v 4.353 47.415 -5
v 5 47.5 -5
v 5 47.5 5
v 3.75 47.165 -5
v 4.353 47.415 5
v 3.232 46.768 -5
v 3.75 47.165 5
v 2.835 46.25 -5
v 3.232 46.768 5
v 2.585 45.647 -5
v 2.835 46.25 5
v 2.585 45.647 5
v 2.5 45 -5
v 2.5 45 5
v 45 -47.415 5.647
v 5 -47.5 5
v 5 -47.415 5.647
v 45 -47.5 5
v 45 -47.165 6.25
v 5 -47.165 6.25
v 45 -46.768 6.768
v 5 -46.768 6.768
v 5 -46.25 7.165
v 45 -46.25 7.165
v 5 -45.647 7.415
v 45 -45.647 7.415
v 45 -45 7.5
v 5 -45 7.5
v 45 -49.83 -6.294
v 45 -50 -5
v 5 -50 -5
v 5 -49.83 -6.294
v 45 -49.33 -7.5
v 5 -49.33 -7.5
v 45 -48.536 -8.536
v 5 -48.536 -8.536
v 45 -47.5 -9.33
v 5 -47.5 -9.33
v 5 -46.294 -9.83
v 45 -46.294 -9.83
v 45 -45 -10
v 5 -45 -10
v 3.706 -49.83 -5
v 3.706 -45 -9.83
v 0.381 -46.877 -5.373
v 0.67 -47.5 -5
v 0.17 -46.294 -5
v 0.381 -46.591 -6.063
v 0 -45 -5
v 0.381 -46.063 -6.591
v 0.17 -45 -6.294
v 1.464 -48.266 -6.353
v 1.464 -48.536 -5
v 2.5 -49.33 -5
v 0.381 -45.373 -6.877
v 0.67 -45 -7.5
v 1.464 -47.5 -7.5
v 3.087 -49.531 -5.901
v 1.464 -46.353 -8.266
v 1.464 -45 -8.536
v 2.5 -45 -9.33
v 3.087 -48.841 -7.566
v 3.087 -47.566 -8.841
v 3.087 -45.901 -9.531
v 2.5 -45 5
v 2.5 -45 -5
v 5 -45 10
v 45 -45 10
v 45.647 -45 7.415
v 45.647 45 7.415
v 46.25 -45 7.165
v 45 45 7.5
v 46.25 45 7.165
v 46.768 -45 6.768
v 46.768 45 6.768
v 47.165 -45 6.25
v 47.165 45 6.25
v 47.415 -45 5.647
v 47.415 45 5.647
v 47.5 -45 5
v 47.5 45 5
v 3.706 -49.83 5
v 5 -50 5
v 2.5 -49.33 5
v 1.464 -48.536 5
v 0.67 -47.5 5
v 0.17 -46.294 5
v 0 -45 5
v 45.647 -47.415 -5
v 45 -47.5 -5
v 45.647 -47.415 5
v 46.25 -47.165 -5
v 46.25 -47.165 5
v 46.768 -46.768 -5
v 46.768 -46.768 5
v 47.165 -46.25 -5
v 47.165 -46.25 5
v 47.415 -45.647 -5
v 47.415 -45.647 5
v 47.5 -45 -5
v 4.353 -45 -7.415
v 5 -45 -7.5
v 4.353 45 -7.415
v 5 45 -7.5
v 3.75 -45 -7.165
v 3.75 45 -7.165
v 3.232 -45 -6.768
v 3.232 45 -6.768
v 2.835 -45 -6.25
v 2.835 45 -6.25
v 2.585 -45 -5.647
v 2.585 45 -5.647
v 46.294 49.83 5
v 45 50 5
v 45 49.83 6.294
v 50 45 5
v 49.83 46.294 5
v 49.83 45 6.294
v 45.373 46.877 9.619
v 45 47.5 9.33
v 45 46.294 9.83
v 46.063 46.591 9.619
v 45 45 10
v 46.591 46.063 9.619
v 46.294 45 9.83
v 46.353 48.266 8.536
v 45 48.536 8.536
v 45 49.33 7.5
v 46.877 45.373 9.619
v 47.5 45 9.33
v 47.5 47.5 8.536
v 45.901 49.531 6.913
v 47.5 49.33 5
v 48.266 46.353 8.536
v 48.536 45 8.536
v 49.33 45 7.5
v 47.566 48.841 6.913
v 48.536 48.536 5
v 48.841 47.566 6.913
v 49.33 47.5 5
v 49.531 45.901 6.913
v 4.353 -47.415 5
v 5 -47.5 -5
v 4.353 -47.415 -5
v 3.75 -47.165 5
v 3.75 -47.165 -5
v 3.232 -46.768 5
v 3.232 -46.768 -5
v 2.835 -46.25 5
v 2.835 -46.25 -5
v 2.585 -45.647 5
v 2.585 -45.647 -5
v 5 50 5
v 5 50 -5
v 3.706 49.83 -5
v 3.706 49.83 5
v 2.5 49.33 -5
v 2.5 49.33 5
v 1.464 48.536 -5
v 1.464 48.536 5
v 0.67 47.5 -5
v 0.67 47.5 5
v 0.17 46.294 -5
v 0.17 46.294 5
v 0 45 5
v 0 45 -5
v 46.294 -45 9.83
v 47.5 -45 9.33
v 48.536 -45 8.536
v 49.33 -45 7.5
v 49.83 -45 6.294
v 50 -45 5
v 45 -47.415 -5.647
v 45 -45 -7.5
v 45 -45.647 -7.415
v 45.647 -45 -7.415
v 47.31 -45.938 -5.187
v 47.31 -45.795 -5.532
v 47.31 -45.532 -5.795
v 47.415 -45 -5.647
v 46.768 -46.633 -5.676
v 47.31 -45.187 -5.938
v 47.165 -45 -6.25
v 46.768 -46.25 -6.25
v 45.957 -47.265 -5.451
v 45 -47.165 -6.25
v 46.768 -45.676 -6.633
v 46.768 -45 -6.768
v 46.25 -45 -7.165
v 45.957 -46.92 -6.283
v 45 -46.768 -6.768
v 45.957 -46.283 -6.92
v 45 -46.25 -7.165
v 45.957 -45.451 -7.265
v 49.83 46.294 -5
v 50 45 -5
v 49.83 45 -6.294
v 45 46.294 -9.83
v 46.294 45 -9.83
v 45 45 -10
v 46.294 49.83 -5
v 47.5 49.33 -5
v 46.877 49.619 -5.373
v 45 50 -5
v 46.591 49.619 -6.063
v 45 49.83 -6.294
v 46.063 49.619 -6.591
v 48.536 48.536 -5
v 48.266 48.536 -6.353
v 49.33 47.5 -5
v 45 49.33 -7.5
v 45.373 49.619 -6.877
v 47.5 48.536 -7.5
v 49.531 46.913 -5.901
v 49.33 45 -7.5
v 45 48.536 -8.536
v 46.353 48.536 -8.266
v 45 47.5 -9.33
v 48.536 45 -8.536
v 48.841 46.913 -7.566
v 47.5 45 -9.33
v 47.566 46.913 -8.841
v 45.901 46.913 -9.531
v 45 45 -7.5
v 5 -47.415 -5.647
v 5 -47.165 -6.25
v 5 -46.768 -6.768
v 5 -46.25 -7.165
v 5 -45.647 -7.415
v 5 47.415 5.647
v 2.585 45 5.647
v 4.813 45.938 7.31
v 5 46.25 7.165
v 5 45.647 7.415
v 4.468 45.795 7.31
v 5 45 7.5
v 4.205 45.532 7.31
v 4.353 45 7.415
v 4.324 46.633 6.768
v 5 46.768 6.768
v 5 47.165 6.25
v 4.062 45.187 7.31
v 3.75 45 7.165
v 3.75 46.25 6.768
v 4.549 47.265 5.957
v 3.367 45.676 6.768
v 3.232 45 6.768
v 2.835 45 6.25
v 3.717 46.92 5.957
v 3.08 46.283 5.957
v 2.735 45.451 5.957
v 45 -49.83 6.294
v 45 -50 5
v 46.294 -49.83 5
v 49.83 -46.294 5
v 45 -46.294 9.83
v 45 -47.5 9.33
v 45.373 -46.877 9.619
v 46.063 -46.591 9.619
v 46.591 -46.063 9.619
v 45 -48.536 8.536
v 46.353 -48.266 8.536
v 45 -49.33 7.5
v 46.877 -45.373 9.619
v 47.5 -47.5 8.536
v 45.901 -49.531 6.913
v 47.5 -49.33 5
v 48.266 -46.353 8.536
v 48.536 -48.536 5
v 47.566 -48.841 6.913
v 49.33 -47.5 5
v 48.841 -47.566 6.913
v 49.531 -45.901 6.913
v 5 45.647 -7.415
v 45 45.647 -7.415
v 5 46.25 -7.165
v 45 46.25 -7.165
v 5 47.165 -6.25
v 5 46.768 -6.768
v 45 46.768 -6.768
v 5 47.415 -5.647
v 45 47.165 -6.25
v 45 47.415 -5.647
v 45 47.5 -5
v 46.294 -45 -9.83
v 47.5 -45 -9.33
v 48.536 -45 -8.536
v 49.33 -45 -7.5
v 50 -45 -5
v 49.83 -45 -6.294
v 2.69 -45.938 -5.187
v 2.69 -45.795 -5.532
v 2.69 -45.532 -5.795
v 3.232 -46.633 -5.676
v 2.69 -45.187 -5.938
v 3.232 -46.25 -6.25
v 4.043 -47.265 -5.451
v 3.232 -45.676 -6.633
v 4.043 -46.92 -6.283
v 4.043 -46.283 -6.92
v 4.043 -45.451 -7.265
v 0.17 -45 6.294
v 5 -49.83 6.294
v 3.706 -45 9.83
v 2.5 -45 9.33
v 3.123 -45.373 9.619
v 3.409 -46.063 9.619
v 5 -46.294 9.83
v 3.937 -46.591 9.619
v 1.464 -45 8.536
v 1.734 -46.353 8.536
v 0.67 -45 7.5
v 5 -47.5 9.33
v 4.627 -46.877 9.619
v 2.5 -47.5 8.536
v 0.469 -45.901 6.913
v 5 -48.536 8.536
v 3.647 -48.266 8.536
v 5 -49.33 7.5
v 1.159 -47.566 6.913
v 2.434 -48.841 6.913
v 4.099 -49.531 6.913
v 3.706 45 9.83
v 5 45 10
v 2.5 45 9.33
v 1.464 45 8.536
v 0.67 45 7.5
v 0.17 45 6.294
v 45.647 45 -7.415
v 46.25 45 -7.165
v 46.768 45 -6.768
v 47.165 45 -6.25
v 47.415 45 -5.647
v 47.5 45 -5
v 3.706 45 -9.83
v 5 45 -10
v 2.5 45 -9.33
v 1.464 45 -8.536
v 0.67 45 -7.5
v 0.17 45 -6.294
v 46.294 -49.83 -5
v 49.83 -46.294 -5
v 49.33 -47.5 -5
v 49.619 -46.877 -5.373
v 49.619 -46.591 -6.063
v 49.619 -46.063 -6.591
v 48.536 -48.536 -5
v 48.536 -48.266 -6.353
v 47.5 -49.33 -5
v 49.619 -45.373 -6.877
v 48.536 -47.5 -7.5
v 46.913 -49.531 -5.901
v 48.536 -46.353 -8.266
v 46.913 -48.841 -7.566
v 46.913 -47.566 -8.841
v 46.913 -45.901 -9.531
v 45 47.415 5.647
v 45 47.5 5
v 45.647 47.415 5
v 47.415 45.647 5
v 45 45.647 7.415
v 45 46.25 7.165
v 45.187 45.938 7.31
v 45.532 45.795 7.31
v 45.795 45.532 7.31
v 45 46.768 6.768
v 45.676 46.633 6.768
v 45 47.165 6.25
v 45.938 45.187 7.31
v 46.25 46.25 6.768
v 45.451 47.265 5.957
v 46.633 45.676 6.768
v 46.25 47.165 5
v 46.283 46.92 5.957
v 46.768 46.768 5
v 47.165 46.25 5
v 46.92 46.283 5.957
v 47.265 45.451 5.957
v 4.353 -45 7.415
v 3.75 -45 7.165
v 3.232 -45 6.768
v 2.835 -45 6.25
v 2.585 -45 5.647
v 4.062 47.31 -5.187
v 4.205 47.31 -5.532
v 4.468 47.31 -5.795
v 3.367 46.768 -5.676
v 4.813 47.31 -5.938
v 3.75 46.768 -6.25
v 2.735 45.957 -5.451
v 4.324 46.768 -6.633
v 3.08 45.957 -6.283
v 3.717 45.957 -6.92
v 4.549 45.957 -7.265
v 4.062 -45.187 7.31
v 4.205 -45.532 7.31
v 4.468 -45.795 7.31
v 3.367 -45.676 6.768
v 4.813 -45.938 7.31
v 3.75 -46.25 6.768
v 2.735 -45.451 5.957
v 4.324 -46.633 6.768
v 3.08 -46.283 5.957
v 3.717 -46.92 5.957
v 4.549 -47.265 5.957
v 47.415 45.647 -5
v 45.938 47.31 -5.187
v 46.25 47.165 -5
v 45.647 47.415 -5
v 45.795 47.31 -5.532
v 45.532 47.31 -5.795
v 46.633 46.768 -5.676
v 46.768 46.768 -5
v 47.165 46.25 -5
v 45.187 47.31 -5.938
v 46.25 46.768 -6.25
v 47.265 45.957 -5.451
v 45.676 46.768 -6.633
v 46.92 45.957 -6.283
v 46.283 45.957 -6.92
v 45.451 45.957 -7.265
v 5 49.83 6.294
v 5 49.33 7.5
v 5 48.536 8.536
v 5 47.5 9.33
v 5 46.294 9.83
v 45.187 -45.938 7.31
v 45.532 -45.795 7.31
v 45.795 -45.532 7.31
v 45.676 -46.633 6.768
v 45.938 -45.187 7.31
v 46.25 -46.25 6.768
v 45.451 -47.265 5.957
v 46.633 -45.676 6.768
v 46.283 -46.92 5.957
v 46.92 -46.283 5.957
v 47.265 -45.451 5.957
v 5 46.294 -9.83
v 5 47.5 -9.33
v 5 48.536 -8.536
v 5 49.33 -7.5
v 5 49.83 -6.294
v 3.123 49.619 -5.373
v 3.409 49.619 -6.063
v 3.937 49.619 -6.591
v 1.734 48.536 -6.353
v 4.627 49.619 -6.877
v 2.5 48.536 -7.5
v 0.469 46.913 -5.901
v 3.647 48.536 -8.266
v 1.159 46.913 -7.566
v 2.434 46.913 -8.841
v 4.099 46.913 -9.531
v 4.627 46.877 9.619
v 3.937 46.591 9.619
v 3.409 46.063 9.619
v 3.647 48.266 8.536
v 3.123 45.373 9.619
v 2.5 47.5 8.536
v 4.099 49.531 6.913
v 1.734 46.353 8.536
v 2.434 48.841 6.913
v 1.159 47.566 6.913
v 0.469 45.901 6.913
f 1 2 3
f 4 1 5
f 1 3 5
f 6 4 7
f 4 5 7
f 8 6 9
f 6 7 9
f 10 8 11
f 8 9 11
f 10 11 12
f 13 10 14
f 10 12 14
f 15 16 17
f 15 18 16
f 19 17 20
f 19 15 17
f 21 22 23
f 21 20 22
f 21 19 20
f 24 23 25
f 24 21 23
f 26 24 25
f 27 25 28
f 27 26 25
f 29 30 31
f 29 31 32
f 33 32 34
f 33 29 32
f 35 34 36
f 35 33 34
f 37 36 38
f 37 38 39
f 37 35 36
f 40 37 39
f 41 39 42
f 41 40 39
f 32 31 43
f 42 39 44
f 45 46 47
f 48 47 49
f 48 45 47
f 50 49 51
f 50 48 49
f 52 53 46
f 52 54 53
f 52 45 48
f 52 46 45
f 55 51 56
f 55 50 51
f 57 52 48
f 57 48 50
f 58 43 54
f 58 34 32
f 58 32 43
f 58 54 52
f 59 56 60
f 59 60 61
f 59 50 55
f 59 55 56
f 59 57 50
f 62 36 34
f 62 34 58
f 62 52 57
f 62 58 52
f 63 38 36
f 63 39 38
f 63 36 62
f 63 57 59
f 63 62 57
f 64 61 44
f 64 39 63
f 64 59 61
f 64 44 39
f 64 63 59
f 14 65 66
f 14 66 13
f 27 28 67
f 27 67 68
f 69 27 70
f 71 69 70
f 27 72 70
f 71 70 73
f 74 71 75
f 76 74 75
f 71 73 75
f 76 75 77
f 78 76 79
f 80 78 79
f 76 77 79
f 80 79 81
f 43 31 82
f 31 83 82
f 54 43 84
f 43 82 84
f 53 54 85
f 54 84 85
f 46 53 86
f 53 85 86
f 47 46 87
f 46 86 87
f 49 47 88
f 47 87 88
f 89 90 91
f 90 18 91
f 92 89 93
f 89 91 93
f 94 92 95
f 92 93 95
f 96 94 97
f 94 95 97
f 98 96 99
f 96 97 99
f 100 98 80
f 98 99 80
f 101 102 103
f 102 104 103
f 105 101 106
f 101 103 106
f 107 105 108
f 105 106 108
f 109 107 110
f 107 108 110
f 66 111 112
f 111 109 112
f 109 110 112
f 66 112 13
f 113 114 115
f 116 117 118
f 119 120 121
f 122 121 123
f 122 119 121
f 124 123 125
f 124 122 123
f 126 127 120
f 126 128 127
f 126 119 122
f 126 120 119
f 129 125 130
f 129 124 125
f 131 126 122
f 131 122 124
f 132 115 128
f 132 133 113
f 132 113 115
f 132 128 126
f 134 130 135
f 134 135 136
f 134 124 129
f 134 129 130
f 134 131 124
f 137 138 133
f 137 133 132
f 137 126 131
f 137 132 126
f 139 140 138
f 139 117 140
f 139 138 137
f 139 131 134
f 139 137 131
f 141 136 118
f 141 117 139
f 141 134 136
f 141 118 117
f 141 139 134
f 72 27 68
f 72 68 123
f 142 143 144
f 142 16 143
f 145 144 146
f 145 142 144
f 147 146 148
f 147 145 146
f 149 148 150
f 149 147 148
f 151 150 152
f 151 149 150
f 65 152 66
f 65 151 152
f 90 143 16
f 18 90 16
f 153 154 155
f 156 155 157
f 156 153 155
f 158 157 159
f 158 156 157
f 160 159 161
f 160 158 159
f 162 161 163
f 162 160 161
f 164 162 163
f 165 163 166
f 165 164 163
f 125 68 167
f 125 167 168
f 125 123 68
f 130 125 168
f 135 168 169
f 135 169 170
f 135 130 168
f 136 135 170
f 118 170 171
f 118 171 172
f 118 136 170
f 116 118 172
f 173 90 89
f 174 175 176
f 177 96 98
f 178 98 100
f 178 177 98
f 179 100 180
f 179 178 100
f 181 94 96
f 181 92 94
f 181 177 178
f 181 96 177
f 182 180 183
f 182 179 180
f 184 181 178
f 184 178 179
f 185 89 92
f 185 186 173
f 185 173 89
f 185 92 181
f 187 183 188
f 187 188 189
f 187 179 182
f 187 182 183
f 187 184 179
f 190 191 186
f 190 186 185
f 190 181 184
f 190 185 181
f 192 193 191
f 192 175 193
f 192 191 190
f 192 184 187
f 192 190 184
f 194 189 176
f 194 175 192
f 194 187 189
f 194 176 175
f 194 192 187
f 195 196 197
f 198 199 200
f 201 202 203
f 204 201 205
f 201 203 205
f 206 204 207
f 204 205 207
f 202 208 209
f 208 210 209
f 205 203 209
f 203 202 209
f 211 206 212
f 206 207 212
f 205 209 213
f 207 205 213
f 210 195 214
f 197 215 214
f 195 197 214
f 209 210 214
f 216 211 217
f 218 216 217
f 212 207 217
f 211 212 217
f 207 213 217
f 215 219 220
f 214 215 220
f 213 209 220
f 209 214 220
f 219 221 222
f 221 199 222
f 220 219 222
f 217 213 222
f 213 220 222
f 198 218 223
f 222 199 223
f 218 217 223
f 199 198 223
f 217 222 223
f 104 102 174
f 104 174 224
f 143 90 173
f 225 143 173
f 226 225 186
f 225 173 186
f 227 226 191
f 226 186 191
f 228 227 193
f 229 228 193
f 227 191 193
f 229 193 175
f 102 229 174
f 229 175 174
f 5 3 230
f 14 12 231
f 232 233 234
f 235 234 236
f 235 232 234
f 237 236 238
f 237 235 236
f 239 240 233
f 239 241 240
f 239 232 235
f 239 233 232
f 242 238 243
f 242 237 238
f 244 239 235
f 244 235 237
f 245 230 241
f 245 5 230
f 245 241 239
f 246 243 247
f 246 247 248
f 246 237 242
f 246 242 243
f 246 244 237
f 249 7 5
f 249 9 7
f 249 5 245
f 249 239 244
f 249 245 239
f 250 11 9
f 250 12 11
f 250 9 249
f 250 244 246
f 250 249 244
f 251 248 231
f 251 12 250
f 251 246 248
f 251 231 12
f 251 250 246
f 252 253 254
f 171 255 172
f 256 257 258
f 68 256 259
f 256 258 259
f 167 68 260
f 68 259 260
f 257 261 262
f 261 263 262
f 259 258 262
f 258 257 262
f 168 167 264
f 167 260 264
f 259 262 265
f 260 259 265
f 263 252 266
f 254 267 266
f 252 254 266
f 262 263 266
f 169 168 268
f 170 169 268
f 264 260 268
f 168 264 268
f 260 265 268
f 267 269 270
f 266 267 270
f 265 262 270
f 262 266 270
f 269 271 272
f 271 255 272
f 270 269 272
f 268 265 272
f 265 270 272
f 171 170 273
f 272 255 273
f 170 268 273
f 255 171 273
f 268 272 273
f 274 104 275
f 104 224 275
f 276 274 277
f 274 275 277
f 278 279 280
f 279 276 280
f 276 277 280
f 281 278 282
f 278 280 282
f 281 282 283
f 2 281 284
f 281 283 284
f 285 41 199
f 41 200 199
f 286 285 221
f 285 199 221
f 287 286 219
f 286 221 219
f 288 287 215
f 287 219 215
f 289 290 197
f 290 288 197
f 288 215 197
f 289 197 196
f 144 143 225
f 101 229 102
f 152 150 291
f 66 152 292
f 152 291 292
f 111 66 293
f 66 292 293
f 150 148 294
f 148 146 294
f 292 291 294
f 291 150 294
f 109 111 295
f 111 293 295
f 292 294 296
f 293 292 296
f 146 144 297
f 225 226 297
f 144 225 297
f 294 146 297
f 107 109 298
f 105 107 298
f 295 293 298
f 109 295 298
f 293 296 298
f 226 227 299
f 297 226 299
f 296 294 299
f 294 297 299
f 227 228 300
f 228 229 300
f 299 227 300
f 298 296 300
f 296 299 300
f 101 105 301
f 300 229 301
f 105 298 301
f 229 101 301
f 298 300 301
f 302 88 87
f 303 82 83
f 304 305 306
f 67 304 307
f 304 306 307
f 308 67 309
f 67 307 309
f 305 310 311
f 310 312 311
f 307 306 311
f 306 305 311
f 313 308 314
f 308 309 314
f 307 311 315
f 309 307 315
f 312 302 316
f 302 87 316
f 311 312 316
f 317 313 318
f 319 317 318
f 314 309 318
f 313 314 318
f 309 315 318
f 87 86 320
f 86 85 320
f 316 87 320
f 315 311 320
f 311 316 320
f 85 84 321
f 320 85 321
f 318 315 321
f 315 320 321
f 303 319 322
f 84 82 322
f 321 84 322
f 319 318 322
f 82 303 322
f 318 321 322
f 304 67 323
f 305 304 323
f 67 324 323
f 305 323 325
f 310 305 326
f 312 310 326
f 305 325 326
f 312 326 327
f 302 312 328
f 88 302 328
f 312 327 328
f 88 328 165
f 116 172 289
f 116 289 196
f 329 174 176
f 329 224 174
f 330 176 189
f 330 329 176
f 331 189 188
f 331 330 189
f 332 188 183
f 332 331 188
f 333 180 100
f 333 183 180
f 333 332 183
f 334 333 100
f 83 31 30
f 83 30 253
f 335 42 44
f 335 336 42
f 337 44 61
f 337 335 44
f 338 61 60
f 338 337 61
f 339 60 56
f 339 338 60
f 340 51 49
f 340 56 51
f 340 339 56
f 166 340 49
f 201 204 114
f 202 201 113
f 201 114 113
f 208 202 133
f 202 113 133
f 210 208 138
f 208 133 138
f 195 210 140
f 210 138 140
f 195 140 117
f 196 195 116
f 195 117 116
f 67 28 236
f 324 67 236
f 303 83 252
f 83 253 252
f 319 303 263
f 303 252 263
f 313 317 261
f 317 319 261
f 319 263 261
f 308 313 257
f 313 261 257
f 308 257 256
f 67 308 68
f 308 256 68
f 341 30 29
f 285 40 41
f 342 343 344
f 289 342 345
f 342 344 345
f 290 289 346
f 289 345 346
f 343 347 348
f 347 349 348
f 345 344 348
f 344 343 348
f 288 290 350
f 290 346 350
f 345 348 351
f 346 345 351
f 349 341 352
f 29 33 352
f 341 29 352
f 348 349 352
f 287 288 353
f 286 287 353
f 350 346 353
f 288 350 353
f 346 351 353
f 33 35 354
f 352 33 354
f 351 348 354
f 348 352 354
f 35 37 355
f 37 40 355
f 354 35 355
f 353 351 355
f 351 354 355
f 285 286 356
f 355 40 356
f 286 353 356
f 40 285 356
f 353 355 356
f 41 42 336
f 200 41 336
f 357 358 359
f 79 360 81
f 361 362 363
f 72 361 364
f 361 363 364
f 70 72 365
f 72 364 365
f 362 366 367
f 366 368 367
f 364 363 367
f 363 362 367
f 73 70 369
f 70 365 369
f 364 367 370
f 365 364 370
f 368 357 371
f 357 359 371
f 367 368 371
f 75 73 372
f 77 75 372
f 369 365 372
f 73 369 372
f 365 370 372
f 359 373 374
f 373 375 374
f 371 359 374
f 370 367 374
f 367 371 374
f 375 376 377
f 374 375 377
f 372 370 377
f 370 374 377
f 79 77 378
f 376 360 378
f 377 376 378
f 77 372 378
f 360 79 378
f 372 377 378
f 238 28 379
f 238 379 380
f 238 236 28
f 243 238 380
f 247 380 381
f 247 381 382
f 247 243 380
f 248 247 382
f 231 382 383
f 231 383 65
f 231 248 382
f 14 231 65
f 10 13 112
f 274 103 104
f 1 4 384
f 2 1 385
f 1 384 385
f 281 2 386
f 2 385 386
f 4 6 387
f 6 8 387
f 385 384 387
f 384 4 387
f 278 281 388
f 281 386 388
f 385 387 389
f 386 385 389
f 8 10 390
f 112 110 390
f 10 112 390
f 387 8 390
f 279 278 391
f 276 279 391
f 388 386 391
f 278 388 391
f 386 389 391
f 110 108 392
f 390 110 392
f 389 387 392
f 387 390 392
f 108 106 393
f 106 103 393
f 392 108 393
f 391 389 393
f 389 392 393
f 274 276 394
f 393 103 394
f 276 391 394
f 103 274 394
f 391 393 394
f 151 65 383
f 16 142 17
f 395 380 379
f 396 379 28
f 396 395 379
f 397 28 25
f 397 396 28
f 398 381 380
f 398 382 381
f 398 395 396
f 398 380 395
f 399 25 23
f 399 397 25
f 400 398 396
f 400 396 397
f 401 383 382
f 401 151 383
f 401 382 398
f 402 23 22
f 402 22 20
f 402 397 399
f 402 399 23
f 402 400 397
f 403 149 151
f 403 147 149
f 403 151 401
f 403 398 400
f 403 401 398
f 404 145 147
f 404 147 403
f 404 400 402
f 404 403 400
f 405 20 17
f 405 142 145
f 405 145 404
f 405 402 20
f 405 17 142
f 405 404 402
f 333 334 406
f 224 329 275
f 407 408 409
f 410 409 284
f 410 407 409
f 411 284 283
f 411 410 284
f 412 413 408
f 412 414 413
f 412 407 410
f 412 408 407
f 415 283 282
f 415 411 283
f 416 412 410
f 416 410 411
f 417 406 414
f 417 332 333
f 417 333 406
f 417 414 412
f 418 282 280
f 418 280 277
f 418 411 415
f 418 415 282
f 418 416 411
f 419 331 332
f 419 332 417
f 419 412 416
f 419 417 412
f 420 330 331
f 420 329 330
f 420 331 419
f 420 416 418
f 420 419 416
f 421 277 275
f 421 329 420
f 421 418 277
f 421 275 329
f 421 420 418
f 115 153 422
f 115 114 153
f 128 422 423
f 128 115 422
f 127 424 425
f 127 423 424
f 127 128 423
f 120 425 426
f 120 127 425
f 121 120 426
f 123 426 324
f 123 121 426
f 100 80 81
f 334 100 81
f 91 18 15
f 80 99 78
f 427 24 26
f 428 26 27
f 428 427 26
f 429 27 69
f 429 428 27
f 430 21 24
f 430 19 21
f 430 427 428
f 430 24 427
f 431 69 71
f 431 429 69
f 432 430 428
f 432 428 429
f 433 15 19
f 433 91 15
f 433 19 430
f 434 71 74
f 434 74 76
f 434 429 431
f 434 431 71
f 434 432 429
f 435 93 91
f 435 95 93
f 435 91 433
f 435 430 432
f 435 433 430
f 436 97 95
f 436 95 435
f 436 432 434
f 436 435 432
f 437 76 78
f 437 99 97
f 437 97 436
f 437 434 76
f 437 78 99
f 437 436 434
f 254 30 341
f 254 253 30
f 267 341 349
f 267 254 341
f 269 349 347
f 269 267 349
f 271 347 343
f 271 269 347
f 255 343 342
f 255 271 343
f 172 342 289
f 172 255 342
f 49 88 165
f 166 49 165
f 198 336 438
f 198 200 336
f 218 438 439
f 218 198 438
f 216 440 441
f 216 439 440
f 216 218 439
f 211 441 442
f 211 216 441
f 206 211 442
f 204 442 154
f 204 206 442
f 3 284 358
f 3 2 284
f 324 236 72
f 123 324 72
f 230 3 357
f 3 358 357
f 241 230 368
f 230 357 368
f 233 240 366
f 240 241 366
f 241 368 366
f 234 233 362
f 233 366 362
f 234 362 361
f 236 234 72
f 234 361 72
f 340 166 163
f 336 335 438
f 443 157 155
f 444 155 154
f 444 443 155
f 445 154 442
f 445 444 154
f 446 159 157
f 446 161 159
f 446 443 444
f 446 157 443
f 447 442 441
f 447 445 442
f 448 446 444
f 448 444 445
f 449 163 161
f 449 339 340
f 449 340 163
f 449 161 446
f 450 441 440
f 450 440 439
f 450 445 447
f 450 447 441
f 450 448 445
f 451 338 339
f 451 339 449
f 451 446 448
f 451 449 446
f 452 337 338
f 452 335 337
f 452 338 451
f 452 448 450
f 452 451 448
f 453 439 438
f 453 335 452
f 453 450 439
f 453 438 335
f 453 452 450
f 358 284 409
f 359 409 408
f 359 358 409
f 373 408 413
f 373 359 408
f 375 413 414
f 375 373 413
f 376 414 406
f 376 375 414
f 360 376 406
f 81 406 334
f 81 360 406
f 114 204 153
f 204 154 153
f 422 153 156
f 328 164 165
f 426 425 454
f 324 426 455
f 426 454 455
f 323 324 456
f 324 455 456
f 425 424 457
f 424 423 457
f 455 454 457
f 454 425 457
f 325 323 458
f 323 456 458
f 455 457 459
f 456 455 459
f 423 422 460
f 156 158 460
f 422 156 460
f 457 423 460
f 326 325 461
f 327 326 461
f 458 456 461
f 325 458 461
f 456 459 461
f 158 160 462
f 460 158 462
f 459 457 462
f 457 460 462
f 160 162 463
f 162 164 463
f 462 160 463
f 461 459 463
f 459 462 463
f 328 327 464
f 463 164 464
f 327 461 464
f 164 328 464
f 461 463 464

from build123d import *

# Parameters (mm, degrees)
F0_W     = 100
F0_H     = 20
F1_DEPTH = 50
F2_R     = 5
F3_T     = -2.5


# Not quite as in the source:
# - a shell that OpenCascade refuses in one call is made with other operations: the cavity is built on its own and cut out


with BuildPart() as f1:
    # F0 (on Right) → F1 (new body)
    with BuildSketch(Plane.YZ):
        Rectangle(F0_W, F0_H)
    extrude(amount=F1_DEPTH)

    # F2
    f2_edges = [f1.edges().sort_by_distance(p)[0] for p in [
        (25, -50, -10),
        (50, -50, 0),
        (0, -50, 0),
        (0, 0, -10),
        (50, 0, -10),
        (50, 50, 0),
        (0, 50, 0),
        (25, 50, -10),
        (25, 50, 10),
        (0, 0, 10),
        (25, -50, 10),
        (50, 0, 10),
    ]]
    fillet(f2_edges, radius=F2_R)

    # F3: a shell. OpenCascade refuses it in one call, so the cavity is built on its own and cut out:
    # the body offset inwards by the wall thickness, plus a prism from it out through each open face.
    f3_core = offset(f1.part, amount=F3_T, mode=Mode.PRIVATE)
    f3_exits = [f3_core.faces().sort_by_distance(p)[0] for p in [
        (25, 0, 7.5),
    ]]
    add(f3_core, mode=Mode.SUBTRACT)
    extrude(f3_exits, amount=-F3_T, mode=Mode.SUBTRACT)


solid = f1.part
